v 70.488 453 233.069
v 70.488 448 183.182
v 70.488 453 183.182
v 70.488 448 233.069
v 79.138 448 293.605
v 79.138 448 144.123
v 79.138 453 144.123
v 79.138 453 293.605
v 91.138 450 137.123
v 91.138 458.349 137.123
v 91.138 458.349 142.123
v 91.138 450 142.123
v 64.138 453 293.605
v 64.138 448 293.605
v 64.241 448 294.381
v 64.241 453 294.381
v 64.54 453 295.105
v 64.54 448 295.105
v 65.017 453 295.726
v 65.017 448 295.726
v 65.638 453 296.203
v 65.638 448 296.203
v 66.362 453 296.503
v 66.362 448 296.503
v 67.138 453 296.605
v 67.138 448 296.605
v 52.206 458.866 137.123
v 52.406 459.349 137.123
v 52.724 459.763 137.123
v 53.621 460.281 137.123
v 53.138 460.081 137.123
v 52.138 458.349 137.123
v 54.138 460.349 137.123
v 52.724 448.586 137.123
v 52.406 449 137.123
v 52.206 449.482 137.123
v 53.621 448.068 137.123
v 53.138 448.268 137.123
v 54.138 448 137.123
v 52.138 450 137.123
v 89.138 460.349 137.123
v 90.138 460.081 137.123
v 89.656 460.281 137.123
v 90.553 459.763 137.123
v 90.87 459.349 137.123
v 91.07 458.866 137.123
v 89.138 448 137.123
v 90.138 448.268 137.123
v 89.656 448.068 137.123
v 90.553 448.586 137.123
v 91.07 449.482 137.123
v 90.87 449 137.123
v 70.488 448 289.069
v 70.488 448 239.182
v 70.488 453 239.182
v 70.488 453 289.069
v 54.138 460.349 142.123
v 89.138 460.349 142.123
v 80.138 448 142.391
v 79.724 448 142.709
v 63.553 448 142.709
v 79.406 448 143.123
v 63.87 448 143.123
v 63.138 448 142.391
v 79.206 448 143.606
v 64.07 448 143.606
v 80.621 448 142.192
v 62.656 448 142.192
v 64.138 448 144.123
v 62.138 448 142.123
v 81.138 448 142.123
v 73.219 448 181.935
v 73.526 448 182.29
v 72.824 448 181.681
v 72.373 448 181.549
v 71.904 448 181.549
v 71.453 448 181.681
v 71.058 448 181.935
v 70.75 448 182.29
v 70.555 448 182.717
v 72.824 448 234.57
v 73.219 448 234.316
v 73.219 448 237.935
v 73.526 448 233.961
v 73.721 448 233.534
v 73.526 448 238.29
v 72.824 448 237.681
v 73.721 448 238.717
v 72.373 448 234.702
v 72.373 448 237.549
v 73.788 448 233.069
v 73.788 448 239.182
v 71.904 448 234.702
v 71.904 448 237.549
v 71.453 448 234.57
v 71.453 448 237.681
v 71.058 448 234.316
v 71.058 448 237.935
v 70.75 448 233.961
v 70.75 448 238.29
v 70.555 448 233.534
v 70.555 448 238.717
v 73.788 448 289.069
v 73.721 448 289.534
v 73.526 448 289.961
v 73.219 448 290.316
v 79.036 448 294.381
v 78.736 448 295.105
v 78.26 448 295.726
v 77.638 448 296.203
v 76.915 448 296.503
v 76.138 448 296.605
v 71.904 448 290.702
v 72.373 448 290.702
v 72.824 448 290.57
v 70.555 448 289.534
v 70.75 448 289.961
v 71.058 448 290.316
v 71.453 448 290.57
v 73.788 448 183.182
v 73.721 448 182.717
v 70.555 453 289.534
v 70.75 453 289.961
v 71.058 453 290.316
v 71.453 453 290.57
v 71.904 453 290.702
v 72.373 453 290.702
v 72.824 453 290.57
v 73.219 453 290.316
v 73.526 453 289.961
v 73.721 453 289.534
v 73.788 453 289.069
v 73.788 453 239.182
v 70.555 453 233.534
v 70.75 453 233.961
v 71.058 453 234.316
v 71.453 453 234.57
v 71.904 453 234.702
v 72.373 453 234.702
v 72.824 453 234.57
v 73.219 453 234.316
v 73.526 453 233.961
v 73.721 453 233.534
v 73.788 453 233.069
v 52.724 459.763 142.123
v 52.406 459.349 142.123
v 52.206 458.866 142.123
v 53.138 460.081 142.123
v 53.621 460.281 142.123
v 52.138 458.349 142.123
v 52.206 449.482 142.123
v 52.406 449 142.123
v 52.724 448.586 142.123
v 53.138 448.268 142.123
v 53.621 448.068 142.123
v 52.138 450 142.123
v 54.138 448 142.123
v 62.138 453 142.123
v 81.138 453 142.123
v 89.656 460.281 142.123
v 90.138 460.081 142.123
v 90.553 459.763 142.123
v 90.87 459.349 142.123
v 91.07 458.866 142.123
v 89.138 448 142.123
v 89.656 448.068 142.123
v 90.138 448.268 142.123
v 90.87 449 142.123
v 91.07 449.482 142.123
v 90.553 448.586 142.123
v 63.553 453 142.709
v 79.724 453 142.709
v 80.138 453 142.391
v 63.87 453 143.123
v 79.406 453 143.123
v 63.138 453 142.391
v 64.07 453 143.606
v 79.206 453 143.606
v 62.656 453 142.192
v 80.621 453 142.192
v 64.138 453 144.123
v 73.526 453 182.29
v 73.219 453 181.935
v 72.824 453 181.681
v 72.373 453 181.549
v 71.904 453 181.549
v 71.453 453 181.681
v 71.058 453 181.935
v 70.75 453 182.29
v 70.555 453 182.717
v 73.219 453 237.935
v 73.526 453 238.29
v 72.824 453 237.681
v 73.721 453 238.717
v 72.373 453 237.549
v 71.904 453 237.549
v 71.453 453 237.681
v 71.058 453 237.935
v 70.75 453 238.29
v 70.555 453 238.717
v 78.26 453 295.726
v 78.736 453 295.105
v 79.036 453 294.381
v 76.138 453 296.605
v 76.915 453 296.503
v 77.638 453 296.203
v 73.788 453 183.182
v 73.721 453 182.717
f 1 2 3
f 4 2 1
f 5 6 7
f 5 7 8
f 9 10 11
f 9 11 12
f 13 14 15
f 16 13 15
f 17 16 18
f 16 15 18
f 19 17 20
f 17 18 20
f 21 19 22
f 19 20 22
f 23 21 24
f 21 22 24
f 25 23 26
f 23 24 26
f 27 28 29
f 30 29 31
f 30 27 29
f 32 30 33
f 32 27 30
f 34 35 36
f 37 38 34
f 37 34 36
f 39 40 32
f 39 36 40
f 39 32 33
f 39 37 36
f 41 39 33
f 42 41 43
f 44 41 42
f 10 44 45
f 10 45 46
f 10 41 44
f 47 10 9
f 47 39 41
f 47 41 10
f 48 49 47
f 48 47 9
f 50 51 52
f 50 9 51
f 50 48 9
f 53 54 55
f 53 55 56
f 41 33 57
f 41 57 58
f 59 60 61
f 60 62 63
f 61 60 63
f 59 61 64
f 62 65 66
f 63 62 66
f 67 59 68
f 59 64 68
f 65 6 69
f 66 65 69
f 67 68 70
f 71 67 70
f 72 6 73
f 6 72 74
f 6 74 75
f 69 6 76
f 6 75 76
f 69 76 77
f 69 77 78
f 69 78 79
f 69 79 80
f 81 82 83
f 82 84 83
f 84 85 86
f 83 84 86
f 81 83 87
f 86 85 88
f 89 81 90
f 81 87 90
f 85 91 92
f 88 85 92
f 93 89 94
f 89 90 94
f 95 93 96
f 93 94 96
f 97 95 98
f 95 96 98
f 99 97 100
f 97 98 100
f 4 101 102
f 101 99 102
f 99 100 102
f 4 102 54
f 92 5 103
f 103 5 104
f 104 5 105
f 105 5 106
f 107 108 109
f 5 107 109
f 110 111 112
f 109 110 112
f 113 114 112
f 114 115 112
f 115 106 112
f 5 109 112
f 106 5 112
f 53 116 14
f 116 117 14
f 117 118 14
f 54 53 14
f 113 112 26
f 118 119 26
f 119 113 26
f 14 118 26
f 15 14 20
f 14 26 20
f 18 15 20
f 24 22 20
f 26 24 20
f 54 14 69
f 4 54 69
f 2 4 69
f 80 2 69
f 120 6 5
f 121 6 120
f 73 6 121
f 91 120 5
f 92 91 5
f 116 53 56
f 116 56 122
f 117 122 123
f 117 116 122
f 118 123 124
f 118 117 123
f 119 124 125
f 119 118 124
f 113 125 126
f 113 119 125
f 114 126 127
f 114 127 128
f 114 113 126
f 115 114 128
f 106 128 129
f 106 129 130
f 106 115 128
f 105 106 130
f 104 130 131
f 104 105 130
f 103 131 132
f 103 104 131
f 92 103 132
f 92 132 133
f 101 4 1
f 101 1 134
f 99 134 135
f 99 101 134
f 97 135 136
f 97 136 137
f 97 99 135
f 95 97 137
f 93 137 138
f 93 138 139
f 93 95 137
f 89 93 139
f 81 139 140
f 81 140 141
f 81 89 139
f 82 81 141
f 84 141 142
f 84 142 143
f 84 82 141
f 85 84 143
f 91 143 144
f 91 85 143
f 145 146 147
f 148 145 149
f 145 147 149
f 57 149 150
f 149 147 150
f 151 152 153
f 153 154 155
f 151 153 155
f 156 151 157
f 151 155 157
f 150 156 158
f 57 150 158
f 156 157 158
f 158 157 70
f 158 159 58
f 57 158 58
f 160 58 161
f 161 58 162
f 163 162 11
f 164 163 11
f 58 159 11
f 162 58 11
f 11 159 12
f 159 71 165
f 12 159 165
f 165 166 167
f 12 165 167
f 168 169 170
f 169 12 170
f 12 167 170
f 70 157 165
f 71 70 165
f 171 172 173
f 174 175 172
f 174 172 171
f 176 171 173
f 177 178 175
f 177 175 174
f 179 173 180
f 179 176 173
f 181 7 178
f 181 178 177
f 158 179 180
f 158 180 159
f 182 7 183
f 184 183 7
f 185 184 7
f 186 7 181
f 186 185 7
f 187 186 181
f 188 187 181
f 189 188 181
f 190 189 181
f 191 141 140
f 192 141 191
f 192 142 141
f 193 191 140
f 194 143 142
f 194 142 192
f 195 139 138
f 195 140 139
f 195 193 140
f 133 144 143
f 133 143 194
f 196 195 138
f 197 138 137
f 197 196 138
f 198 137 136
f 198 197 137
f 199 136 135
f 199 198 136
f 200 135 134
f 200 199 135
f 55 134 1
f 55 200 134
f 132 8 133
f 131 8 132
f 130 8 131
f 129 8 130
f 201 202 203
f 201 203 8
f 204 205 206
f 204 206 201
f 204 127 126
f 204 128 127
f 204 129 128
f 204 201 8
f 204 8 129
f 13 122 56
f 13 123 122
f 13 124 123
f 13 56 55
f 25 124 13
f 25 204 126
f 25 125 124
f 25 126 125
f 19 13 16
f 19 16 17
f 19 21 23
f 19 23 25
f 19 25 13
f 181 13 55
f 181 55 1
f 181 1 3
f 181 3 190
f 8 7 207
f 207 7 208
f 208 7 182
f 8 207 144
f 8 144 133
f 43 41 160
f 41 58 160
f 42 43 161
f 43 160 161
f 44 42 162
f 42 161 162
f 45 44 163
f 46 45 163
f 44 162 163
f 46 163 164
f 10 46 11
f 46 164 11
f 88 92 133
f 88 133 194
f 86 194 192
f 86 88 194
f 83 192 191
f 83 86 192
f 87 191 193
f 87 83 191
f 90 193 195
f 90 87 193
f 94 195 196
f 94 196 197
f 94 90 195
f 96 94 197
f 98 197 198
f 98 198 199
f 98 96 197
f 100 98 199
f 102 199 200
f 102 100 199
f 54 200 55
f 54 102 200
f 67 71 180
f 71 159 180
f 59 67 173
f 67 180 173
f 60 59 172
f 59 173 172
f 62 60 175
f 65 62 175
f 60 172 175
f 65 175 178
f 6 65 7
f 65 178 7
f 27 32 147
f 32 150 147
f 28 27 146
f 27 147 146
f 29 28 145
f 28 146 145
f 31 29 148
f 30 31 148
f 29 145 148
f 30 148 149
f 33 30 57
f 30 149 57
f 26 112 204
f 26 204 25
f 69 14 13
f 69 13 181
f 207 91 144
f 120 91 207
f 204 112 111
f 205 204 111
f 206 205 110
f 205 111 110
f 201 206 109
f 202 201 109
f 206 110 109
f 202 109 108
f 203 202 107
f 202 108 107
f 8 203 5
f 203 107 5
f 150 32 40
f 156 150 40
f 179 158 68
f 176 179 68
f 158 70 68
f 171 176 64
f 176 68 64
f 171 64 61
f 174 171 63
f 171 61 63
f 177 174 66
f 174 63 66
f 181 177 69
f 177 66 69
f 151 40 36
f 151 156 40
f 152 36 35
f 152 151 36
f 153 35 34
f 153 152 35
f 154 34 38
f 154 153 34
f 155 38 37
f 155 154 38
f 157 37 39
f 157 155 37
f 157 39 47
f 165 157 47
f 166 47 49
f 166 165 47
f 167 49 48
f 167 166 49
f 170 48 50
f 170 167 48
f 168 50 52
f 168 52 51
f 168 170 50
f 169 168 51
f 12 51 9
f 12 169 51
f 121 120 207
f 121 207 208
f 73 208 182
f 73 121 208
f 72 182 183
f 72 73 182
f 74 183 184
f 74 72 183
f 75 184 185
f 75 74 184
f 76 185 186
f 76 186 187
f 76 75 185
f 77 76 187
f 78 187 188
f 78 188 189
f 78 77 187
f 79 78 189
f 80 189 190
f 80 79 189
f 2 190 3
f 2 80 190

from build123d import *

# Parameters (mm, degrees)
PAD_DEPTH    = 5
SKETCH001_W  = 39
SKETCH001_H  = 12.348814
PAD001_DEPTH = 5
FILLET_R     = 2
FILLET001_R  = 2


with BuildPart() as part:
    # Sketch (on Face5 of Binder) → Pad (new body)
    with BuildSketch(Plane(origin=(8e-06, 448.000007, 1.5e-05), x_dir=(-1, 0, 0), z_dir=(0, 1, 0))):
        with BuildLine():
            ThreePointArc((-76.138322, 296.60498), (-78.259642, 295.726301), (-79.138322, 293.60498))
            Line((-79.138322, 140.123388), (-79.138322, 293.60498))
            ThreePointArc((-79.138322, 140.123388), (-78.259642, 138.002067), (-76.138322, 137.123388))
            Line((-67.138322, 137.123388), (-76.138322, 137.123388))
            ThreePointArc((-67.138322, 137.123388), (-65.017001, 138.002067), (-64.138322, 140.123388))
            Line((-64.138322, 293.60498), (-64.138322, 140.123388))
            ThreePointArc((-64.138322, 293.60498), (-65.017001, 295.726301), (-67.138322, 296.60498))
            Line((-76.138322, 296.60498), (-67.138322, 296.60498))
        make_face()
        with BuildLine():
            ThreePointArc((-70.488322, 289.068935), (-72.138322, 290.718935), (-73.788322, 289.068935))
            Line((-73.788322, 289.068935), (-73.788322, 239.181824))
            ThreePointArc((-73.788322, 239.181824), (-72.138322, 237.531824), (-70.488322, 239.181824))
            Line((-70.488322, 239.181824), (-70.488322, 289.068935))
        make_face(mode=Mode.SUBTRACT)
        with BuildLine():
            ThreePointArc((-70.488322, 233.068934), (-72.138322, 234.718934), (-73.788322, 233.068934))
            Line((-73.788322, 233.068934), (-73.788322, 183.181823))
            ThreePointArc((-73.788322, 183.181823), (-72.138322, 181.531823), (-70.488322, 183.181823))
            Line((-70.488322, 183.181823), (-70.488322, 233.068934))
        make_face(mode=Mode.SUBTRACT)
    extrude(amount=PAD_DEPTH)

    # Sketch001 (on Face4 of Pad) → Pad001 (join)
    with BuildSketch(Plane(origin=(0, -5e-06, 137.123388), x_dir=(1, 0, 0), z_dir=(0, 0, -1))):
        with Locations((71.638329, -454.174413)):
            Rectangle(SKETCH001_W, SKETCH001_H)
    extrude(amount=-PAD001_DEPTH)

    # Fillet
    fillet_edges = [part.edges().sort_by_distance(p)[0] for p in [
        (52.138329, 460.348815, 139.623403),
        (91.138329, 460.348815, 139.623403),
        (52.138329, 448.000002, 139.623403),
        (91.138329, 448.000002, 139.623403),
    ]]
    fillet(fillet_edges, radius=FILLET_R)

    # Fillet001
    fillet001_edges = [part.edges().sort_by_distance(p)[0] for p in [
        (79.13833, 450.500001, 142.123403),
        (64.13833, 450.500002, 142.123403),
    ]]
    fillet(fillet001_edges, radius=FILLET001_R)


solid = part.part
